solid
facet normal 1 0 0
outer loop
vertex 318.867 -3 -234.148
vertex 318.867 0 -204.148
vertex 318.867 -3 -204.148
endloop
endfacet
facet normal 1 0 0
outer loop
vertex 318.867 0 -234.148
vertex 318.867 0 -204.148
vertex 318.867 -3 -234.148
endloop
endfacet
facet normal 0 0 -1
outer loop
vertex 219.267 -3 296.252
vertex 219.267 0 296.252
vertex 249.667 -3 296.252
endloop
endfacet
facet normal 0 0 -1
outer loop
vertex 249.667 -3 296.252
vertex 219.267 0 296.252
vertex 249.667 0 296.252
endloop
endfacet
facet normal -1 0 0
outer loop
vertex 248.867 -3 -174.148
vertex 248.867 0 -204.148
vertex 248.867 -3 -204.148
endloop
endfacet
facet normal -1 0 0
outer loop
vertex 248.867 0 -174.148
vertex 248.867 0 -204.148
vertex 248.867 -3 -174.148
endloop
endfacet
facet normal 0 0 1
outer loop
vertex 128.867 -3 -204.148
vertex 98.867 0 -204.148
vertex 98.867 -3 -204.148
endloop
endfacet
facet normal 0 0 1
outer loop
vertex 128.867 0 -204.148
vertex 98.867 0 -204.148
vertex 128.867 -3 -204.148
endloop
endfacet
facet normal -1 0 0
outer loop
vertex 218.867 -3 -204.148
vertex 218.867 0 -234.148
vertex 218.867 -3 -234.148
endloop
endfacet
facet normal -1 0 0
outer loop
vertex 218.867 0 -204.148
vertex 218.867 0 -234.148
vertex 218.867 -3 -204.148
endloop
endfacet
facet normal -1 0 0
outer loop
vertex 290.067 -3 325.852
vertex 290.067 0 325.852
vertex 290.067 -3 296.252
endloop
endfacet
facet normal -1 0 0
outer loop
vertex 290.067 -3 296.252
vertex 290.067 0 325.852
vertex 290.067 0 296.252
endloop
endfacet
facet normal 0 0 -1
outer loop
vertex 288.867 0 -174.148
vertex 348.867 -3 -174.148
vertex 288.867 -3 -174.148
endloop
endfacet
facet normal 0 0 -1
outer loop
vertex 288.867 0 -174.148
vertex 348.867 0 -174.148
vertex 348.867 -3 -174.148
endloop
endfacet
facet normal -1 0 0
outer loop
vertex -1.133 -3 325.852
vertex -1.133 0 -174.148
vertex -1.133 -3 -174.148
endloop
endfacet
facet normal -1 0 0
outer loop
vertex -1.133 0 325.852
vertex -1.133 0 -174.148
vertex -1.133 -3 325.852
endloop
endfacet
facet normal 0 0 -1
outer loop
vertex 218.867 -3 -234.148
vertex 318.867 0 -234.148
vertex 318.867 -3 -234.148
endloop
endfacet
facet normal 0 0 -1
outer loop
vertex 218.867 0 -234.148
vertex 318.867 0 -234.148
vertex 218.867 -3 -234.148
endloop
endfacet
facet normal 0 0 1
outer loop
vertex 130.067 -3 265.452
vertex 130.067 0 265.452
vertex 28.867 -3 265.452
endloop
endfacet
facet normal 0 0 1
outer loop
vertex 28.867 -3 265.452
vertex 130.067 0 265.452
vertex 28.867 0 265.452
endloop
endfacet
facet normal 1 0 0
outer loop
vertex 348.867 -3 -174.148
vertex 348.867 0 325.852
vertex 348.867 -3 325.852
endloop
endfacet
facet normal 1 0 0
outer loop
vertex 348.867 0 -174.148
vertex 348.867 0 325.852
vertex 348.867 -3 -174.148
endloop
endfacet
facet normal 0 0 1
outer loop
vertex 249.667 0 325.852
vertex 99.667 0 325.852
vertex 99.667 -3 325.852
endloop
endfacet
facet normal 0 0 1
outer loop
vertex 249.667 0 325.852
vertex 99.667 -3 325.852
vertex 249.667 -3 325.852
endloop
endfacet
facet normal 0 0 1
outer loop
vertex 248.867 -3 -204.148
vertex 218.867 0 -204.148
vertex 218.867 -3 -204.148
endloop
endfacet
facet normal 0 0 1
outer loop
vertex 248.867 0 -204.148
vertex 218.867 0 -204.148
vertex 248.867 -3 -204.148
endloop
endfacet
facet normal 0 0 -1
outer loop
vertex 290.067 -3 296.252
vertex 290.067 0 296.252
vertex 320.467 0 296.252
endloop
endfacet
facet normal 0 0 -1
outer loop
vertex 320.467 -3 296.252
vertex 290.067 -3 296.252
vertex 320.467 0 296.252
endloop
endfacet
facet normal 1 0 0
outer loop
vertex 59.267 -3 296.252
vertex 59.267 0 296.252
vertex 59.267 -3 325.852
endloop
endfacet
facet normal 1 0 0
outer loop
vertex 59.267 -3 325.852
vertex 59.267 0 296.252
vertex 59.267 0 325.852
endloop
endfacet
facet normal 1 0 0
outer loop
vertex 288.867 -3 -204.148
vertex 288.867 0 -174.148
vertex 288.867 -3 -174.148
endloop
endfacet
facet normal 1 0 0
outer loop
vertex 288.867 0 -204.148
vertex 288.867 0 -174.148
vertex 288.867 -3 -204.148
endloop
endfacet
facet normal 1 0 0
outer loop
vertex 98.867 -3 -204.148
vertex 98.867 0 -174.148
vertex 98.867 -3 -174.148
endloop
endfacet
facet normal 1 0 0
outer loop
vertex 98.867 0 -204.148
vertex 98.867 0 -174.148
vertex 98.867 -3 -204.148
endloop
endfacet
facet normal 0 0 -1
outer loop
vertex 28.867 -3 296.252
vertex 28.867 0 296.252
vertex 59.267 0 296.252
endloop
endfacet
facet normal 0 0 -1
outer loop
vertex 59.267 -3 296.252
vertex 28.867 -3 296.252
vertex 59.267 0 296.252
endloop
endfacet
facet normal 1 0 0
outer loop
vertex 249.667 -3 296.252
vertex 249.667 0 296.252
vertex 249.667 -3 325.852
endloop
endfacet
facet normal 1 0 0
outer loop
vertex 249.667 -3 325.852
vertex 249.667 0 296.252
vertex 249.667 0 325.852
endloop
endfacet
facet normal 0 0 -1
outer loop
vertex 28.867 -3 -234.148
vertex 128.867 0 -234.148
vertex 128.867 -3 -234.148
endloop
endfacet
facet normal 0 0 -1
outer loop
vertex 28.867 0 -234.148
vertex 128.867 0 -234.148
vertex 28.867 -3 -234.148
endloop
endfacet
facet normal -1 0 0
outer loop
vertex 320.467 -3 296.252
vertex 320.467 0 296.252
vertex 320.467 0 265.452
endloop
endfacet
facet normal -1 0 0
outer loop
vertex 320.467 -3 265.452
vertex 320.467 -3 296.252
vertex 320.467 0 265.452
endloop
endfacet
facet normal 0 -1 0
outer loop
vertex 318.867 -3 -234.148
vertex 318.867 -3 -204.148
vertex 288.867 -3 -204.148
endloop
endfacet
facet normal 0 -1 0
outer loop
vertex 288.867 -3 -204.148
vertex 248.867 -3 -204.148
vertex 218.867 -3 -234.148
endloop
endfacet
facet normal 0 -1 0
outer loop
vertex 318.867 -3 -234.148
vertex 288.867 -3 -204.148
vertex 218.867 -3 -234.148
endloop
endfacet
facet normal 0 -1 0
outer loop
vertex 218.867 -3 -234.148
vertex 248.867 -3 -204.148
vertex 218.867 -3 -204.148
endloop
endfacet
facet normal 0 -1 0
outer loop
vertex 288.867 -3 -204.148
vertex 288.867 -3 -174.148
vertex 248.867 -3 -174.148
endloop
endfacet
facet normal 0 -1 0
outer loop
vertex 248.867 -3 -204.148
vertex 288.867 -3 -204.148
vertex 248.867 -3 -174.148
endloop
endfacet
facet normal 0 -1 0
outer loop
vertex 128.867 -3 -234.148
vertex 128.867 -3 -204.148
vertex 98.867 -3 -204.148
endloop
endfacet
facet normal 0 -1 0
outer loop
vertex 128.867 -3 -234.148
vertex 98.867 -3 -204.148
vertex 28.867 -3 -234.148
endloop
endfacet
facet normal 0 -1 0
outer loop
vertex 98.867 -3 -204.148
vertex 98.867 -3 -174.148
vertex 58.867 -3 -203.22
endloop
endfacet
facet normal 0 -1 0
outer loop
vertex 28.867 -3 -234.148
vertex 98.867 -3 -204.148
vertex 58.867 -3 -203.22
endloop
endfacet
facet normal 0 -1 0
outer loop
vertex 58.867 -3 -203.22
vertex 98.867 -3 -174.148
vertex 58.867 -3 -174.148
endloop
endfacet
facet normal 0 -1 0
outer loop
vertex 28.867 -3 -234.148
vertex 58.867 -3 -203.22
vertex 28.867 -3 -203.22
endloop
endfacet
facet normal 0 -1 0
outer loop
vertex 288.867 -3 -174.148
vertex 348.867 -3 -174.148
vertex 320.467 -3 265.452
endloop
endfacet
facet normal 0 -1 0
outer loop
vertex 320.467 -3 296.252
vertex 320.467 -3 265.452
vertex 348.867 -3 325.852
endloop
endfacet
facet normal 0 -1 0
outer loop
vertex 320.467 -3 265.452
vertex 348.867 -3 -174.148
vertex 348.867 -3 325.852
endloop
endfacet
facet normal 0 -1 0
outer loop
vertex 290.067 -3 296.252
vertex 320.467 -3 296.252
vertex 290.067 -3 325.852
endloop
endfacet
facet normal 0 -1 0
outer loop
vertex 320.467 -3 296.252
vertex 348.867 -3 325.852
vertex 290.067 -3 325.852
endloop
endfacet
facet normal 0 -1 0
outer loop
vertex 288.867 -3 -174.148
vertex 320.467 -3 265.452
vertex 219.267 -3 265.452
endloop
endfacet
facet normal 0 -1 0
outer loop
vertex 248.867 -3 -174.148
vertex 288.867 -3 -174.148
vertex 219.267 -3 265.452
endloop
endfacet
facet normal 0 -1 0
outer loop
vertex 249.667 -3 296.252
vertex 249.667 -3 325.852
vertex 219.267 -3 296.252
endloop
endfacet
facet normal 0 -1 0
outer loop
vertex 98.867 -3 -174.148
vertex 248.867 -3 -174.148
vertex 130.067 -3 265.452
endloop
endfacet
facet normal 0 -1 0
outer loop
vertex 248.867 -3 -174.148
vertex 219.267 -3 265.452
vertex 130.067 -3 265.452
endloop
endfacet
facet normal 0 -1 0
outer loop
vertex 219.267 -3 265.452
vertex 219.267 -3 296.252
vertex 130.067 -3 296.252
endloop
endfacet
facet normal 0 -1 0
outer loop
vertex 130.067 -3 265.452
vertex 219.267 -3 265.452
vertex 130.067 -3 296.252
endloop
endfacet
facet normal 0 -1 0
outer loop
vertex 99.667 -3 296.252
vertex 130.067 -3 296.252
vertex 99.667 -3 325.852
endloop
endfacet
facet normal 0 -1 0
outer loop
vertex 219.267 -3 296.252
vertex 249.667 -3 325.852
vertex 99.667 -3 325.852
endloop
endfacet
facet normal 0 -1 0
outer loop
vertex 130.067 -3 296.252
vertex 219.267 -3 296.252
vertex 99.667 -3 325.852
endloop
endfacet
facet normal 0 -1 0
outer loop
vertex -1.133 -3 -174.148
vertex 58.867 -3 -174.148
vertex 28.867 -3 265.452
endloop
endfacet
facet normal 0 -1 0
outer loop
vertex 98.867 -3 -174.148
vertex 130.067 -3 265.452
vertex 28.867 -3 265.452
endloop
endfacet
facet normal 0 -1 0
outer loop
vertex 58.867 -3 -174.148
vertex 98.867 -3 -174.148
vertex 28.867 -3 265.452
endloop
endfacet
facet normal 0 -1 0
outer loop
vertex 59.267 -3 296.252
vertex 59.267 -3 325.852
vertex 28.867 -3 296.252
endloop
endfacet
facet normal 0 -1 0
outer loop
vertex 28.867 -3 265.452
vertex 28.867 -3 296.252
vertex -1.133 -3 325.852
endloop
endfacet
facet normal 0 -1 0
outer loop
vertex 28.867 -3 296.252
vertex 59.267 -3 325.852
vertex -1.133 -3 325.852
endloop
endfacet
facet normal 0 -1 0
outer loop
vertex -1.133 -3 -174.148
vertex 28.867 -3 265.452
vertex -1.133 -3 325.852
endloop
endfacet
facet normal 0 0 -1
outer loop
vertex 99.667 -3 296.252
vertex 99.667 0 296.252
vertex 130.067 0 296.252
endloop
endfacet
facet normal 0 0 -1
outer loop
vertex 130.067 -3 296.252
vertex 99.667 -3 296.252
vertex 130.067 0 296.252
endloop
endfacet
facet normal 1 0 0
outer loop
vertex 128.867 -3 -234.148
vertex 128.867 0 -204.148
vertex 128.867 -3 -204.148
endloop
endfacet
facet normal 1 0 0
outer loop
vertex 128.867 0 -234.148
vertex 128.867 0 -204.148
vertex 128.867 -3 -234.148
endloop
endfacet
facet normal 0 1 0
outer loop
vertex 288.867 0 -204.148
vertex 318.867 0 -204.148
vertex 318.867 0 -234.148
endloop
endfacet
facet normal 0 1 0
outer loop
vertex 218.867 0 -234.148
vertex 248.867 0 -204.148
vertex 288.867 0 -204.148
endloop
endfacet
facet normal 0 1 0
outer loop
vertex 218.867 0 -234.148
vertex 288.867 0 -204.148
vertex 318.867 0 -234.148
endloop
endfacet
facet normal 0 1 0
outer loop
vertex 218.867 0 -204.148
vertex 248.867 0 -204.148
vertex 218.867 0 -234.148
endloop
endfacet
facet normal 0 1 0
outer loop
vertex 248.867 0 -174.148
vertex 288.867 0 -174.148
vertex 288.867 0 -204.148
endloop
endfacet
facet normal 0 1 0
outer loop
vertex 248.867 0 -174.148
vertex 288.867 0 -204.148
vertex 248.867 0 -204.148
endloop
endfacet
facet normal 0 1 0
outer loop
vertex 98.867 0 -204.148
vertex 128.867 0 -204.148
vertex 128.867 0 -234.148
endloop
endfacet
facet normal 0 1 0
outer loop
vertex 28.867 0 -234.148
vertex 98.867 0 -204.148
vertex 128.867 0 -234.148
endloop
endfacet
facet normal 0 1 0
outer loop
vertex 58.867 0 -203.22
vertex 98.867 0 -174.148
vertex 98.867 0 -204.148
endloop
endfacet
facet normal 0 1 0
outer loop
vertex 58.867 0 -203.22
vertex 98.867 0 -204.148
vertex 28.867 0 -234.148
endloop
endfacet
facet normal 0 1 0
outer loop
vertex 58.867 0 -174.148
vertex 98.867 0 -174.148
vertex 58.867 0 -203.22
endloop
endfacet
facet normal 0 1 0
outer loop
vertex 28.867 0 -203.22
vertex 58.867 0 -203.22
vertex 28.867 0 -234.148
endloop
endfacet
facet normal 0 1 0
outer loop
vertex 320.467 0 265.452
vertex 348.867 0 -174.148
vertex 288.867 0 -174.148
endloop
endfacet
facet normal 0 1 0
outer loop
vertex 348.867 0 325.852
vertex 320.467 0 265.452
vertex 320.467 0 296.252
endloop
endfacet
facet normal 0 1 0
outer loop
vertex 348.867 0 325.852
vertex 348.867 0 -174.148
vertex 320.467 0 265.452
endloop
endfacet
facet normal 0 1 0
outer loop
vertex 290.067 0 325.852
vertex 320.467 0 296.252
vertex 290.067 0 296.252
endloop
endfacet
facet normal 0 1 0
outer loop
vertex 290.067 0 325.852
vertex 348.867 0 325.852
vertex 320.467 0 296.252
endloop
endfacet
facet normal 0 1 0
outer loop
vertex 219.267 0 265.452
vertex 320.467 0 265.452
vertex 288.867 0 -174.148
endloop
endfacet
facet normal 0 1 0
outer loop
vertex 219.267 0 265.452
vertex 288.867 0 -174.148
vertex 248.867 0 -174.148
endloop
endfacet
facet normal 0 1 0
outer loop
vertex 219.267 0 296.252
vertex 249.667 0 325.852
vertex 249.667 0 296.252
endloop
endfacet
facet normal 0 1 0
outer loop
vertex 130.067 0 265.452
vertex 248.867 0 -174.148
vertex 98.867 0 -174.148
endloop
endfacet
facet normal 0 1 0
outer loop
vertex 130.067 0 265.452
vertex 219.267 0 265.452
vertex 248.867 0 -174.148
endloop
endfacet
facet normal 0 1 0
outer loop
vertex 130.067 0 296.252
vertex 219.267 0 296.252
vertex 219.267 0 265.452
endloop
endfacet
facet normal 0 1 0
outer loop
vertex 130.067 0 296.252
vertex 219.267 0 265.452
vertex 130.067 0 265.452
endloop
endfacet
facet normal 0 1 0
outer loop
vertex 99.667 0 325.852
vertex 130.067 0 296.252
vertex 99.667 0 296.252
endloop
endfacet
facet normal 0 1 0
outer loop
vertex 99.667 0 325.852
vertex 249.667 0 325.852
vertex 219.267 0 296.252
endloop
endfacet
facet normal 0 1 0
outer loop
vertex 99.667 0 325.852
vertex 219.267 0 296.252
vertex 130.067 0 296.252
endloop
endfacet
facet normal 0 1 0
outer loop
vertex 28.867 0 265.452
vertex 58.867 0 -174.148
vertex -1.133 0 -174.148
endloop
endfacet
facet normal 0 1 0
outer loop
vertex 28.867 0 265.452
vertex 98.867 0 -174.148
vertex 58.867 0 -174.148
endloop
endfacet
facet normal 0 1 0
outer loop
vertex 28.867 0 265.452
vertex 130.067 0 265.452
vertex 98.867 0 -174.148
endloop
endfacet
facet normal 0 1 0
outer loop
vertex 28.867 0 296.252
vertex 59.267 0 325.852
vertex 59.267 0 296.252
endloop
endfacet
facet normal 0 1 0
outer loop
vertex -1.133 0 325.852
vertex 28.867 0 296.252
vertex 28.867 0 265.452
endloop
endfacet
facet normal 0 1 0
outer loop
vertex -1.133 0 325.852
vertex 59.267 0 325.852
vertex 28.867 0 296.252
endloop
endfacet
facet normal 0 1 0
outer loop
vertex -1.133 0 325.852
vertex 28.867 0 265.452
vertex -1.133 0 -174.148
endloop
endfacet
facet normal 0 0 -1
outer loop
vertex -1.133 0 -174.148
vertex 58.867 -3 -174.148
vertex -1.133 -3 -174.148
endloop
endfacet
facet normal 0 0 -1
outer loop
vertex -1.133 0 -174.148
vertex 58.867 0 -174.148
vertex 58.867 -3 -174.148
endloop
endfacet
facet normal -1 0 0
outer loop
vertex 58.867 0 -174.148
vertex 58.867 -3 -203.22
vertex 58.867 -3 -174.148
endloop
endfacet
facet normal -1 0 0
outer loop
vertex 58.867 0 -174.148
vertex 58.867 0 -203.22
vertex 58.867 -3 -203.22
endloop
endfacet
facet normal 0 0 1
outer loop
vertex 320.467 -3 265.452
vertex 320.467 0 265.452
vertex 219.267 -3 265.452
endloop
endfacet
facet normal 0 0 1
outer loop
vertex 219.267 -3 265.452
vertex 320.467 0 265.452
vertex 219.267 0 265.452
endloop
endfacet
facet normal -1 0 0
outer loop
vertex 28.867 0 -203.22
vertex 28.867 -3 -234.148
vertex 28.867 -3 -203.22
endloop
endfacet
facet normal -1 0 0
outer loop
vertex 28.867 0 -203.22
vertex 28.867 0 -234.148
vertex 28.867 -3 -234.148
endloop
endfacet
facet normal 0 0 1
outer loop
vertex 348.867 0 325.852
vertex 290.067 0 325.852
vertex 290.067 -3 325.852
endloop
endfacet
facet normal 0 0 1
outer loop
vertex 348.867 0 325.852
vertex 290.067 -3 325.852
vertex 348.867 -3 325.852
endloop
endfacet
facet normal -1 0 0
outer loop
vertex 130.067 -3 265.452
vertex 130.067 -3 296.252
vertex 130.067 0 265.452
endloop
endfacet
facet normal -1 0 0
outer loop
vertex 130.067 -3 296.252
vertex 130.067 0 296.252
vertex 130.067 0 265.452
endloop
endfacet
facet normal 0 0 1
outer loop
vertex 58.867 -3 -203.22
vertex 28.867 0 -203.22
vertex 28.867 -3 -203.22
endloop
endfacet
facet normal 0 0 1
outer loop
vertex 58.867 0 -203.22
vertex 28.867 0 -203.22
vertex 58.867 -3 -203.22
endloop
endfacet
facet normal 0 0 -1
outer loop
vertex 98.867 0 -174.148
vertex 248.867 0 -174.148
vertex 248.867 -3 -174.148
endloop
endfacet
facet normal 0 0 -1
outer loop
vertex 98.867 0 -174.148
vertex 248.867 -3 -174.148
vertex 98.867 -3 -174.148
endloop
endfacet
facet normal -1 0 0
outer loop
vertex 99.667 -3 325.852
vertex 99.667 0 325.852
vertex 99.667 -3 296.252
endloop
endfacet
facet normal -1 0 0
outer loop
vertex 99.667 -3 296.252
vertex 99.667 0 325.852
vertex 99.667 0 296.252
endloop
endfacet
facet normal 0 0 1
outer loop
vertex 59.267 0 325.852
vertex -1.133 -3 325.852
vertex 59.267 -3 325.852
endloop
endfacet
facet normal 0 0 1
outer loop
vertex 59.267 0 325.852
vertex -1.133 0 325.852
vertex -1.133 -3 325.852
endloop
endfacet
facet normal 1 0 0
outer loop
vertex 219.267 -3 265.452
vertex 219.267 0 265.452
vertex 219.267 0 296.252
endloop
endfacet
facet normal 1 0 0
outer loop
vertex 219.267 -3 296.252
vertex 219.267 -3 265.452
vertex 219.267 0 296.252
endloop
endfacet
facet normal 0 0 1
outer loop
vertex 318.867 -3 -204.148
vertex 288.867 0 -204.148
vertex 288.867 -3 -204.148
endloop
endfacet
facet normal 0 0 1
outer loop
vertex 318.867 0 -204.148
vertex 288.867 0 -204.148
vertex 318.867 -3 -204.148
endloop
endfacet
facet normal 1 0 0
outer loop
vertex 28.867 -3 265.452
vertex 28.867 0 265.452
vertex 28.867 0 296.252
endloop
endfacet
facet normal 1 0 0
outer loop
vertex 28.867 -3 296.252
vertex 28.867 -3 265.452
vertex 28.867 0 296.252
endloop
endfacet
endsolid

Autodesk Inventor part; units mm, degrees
ref_plane "YZ Plane" through (0, 0, 0) normal (1, 0, 0) x (0, 1, 0)
ref_plane "XZ Plane" through (0, 0, 0) normal (0, 1, 0) x (-1, 0, 0)
ref_plane "XY Plane" through (0, 0, 0) normal (0, 0, 1) x (1, 0, 0)
sketch "Sketch1" plane through (0, 0, 0) normal (0, 1, 0) x (-1, 0, 0)
  line L0 (-348.8673, 325.8519) -> (-348.8673, -174.1481)
  line L1 (1.1327, -174.1481) -> (1.1327, 325.8519)
  line L2 (-98.8673, -174.1481) -> (-98.8673, -204.1481)
  line L3 (-58.8673, -203.2202) -> (-58.8673, -174.1481)
  line L4 (-128.8673, -204.1481) -> (-128.8673, -234.1481)
  line L5 (-128.8673, -234.1481) -> (-28.8673, -234.1481)
  line L6 (-28.8673, -234.1481) -> (-28.8673, -203.2202)
  line L7 (-58.8673, -174.1481) -> (1.1327, -174.1481)
  line L8 (-28.8673, -203.2202) -> (-58.8673, -203.2202)
  line L9 (-98.8673, -204.1481) -> (-128.8673, -204.1481)
  line L10 (-99.6673, 325.8519) -> (-99.6673, 296.2519)
  line L11 (-59.2673, 296.2519) -> (-59.2673, 325.8519)
  line L12 (-130.0673, 296.2519) -> (-130.0673, 265.4519)
  line L13 (-130.0673, 265.4519) -> (-28.8673, 265.4519)
  line L14 (-28.8673, 265.4519) -> (-28.8673, 296.2519)
  line L15 (-28.8673, 296.2519) -> (-59.2673, 296.2519)
  line L16 (-99.6673, 296.2519) -> (-130.0673, 296.2519)
  line L17 (1.1327, 325.8519) -> (-59.2673, 325.8519)
  line L18 (-320.4673, 296.2519) -> (-320.4673, 265.4519)
  line L19 (-320.4673, 265.4519) -> (-219.2673, 265.4519)
  line L20 (-219.2673, 265.4519) -> (-219.2673, 296.2519)
  line L21 (-290.0673, 325.8519) -> (-290.0673, 296.2519)
  line L22 (-249.6673, 296.2519) -> (-249.6673, 325.8519)
  line L23 (-318.8673, -204.1481) -> (-318.8673, -234.1481)
  line L24 (-318.8673, -234.1481) -> (-218.8673, -234.1481)
  line L25 (-218.8673, -234.1481) -> (-218.8673, -204.1481)
  line L26 (-288.8673, -174.1481) -> (-288.8673, -204.1481)
  line L27 (-248.8673, -204.1481) -> (-248.8673, -174.1481)
  line L28 (-99.6673, 325.8519) -> (-249.6673, 325.8519)
  line L29 (-290.0673, 325.8519) -> (-348.8673, 325.8519)
  line L30 (-219.2673, 296.2519) -> (-249.6673, 296.2519)
  line L31 (-290.0673, 296.2519) -> (-320.4673, 296.2519)
  line L32 (-348.8673, -174.1481) -> (-288.8673, -174.1481)
  line L33 (-248.8673, -174.1481) -> (-98.8673, -174.1481)
  line L34 (-218.8673, -204.1481) -> (-248.8673, -204.1481)
  line L35 (-288.8673, -204.1481) -> (-318.8673, -204.1481)
  point P0 (0, 0)
  dimension "d0" = 500
  dimension "d1" = 350
  dimension "d5" = 100
  dimension "d6" = 40.4
  dimension "d7" = 40
  dimension "d8" = 30
  dimension "d9" = 30.4
  dimension "d11" = 30
  dimension "d15" = 30
  dimension "d20" = 30
  dimension "d30" = 500
  dimension "d33" = 40.4
  dimension "d35" = 30.4
  dimension "d36" = 29.6
  dimension "d37" = 29.6
  dimension "d38" = 30.8
  dimension "d39" = 30.4
  dimension "d40" = 30.4
  dimension "d41" = 30.8
  dimension "d42" = 30.8
  dimension "d43" = 29.6
extrude "Extrusion2" add sketch "Sketch1" against normal blind 3
properties part number "TopCoverLayer" material "Acrylic"
